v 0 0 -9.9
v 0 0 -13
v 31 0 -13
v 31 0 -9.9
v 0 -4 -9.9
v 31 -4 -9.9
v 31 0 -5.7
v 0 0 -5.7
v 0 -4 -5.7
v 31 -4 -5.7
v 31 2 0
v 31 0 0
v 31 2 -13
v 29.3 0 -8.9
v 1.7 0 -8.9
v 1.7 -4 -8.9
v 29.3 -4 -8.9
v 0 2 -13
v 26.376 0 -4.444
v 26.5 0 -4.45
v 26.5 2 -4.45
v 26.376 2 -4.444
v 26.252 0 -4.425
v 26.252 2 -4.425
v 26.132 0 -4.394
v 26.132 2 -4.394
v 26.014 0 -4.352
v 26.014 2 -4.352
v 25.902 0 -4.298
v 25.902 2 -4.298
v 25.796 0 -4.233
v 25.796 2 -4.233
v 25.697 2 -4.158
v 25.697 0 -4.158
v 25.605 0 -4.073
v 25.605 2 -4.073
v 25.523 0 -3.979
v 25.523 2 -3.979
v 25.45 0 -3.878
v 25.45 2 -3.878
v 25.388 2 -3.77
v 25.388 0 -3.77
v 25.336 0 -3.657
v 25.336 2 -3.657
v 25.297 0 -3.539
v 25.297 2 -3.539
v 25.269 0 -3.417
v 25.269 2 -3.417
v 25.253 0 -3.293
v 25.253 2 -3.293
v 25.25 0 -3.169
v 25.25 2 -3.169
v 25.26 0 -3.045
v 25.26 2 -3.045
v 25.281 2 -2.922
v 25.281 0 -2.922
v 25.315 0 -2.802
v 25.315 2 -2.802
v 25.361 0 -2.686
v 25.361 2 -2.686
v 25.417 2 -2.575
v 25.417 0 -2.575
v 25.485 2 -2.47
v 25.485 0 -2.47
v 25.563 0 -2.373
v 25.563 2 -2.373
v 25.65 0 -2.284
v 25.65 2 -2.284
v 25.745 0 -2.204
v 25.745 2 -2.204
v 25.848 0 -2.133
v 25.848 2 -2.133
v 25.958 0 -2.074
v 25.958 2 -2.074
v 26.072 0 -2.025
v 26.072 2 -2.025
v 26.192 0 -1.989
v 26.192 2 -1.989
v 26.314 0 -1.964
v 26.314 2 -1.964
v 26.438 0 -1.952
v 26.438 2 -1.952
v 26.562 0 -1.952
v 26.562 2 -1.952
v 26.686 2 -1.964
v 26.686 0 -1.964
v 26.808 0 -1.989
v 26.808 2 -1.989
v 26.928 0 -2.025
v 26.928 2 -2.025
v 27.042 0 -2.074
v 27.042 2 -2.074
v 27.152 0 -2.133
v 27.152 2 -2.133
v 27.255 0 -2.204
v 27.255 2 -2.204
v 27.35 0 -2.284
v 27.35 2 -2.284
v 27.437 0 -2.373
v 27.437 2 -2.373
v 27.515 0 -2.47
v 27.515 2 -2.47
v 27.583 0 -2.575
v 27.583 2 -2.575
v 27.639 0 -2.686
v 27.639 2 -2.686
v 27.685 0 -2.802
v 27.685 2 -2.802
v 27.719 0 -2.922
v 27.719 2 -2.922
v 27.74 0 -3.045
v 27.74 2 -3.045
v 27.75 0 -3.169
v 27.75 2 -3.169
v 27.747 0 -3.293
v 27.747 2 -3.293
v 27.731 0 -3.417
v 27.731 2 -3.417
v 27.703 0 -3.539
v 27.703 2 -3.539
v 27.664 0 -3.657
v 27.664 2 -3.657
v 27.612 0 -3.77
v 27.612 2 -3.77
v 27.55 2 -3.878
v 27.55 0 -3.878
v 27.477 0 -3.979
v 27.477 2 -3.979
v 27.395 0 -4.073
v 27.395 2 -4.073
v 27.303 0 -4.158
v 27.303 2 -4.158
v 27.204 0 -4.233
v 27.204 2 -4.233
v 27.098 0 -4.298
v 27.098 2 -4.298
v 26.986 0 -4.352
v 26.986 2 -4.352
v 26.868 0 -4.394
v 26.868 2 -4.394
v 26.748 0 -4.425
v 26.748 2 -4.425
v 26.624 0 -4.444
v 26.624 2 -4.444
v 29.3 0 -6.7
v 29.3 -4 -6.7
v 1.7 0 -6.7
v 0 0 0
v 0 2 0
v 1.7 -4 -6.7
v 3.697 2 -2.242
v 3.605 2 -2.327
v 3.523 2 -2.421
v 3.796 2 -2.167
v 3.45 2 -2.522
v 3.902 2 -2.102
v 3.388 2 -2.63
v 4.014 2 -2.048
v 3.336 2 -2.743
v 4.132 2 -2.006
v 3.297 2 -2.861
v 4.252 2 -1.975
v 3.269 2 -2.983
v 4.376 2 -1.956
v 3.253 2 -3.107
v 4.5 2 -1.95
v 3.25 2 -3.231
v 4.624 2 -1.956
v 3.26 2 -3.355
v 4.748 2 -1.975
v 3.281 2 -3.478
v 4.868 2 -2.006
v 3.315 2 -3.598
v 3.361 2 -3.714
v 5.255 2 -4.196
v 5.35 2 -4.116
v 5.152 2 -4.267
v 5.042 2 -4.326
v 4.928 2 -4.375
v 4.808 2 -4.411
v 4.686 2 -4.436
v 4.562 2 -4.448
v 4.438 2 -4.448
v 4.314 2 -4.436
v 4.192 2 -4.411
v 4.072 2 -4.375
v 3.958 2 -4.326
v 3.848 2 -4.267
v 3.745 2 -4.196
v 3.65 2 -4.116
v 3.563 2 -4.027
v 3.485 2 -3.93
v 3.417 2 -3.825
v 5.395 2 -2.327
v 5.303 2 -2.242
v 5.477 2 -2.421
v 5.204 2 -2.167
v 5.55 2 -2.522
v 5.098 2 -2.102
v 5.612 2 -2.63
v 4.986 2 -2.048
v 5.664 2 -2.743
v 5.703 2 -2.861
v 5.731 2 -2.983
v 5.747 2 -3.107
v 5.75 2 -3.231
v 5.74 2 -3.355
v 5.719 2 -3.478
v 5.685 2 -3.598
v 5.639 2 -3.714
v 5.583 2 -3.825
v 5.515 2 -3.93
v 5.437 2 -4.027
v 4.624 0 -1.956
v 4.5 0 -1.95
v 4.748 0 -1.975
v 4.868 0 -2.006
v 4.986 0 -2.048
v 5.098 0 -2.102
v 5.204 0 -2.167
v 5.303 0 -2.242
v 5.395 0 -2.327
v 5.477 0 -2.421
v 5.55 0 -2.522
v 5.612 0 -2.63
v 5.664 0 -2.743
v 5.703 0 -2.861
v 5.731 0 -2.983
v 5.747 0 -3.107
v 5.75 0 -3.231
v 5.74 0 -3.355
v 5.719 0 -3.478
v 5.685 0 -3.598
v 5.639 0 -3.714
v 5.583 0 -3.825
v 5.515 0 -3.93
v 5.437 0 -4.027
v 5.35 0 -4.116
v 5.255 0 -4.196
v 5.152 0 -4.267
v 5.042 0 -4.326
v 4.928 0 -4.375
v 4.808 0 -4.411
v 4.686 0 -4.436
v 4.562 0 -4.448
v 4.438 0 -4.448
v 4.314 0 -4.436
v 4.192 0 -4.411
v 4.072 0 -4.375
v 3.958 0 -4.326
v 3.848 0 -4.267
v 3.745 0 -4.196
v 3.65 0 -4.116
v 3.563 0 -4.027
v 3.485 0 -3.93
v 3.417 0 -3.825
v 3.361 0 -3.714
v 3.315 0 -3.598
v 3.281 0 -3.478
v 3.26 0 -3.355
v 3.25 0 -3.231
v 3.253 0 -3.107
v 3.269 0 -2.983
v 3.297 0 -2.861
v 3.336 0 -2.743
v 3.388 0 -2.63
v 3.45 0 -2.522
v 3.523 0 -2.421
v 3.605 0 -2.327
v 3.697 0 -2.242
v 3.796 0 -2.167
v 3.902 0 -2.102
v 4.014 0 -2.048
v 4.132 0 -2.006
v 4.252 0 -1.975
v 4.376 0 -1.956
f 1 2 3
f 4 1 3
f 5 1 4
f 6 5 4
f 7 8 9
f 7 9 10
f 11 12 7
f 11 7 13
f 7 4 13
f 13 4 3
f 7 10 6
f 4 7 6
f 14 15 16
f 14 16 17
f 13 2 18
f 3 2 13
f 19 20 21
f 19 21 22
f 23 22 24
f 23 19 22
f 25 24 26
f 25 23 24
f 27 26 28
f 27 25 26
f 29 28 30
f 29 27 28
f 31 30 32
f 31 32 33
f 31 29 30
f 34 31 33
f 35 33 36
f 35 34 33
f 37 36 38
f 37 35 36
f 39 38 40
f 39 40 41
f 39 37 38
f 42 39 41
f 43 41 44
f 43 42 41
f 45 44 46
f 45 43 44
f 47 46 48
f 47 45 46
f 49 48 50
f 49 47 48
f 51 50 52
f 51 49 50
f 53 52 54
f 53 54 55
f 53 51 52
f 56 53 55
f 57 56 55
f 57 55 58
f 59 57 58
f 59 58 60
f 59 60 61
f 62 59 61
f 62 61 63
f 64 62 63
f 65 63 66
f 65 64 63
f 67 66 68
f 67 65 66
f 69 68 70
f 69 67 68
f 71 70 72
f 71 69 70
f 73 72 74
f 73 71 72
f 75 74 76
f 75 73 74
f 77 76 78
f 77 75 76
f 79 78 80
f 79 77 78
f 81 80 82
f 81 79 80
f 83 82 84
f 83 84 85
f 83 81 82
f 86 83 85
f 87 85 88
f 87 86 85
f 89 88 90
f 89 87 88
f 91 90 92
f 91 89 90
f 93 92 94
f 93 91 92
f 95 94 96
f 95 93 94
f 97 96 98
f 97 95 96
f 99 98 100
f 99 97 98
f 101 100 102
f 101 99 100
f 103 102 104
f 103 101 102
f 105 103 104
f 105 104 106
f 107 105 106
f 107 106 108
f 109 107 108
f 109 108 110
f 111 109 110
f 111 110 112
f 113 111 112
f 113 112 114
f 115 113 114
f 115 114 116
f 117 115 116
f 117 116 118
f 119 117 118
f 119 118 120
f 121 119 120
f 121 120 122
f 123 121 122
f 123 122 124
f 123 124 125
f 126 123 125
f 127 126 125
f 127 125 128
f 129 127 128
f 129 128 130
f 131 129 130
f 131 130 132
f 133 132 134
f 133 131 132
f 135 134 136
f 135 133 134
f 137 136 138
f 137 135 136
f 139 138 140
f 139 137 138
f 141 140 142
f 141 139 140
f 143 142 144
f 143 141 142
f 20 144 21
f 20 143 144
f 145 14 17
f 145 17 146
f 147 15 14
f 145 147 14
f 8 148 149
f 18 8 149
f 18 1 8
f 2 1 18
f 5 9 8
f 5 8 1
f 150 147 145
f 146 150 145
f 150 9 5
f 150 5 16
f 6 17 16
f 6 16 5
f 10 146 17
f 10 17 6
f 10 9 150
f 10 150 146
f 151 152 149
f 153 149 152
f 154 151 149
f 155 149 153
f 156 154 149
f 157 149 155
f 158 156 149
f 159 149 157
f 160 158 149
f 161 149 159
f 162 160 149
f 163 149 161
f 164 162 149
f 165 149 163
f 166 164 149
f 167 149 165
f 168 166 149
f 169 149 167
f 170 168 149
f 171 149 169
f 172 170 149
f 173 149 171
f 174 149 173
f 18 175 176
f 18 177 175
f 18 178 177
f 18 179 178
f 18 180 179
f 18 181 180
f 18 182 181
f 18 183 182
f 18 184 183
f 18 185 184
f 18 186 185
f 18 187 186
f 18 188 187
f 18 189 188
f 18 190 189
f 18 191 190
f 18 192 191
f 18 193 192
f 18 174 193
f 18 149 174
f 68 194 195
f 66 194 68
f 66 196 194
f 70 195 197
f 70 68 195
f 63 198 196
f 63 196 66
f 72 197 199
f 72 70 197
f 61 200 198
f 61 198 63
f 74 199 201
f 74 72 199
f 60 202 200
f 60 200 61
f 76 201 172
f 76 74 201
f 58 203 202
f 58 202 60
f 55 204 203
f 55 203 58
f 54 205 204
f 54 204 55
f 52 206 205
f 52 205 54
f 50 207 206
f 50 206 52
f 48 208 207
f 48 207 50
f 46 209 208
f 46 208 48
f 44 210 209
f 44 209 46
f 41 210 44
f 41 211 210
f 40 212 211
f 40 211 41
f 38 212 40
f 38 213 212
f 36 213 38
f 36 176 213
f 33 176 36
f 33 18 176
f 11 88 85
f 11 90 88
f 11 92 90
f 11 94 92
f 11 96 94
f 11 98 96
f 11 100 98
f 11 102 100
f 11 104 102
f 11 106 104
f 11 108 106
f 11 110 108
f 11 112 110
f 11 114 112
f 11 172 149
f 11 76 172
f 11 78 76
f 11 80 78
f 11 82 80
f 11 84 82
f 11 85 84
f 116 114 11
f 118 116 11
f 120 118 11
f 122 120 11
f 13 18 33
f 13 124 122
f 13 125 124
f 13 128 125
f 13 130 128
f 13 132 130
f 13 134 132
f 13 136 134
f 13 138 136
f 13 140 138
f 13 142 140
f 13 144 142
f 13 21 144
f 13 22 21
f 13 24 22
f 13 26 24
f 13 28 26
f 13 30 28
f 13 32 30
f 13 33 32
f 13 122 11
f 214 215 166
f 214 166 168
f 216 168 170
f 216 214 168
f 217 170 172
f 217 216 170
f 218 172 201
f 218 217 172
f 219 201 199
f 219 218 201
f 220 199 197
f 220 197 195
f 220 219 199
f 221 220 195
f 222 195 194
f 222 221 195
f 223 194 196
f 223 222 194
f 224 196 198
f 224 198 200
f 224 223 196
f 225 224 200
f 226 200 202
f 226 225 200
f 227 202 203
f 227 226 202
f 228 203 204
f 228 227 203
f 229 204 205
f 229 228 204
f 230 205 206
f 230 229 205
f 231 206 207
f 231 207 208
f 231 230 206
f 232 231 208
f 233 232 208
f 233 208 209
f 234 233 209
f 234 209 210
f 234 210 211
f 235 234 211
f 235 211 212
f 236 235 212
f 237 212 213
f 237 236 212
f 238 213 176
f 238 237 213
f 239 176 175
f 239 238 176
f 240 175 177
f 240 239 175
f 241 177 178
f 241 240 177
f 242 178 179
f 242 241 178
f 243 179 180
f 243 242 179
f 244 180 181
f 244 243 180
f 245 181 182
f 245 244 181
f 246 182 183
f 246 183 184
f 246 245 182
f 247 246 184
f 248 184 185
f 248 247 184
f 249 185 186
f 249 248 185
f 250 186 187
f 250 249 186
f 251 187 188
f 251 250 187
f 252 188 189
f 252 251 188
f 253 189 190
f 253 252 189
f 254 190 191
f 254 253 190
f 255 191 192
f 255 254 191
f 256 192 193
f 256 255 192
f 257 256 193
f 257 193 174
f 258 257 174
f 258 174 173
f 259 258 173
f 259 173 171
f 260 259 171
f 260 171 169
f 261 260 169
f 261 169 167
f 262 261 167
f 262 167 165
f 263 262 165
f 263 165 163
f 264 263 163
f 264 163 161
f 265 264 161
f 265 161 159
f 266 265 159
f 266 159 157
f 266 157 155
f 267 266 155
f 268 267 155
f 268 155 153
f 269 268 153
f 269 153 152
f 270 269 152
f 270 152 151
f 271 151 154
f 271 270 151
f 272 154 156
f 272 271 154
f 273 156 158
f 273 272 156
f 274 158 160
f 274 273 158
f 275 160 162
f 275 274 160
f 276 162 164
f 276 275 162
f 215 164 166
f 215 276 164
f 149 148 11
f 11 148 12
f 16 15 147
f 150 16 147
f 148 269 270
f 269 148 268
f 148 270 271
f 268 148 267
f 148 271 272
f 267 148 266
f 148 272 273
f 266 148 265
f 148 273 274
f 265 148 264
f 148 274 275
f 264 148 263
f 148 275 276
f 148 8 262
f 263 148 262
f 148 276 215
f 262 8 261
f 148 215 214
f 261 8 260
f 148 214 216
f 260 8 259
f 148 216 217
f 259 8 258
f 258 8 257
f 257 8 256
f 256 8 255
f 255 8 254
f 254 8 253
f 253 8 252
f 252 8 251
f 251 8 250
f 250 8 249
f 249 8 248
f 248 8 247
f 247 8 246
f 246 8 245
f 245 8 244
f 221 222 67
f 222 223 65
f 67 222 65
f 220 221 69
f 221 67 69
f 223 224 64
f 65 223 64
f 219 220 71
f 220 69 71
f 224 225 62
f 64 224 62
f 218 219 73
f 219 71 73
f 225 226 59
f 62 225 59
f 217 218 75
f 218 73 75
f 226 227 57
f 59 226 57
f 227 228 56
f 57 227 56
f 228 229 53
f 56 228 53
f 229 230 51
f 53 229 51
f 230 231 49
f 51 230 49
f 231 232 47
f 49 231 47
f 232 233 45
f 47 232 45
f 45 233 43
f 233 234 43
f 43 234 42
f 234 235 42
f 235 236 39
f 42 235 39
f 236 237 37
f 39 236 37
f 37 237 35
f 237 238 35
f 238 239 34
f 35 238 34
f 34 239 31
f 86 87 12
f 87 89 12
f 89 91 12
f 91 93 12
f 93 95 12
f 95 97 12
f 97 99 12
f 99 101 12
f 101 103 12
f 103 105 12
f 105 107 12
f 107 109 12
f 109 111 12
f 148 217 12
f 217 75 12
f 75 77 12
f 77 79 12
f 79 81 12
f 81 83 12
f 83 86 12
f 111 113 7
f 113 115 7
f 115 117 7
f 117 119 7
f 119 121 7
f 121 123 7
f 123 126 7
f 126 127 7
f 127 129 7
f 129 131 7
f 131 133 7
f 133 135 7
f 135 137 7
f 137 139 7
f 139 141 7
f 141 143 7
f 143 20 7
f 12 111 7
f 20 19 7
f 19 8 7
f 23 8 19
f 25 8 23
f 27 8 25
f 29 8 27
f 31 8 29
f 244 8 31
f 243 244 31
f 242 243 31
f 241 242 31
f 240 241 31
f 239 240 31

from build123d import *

# Parameters (mm, degrees)
SKETCH1_W           = 31
SKETCH1_H           = 13
SKETCH1_R           = 1.25
BOSS_EXTRUDE1_DEPTH = 2
SKETCH2_W           = 31
SKETCH2_H           = 4.2
SKETCH2_W_2         = 27.6
SKETCH2_H_2         = 2.2
BOSS_EXTRUDE2_DEPTH = 4


with BuildPart() as part:
    # Sketch1 → Boss-Extrude1 (new body)
    with BuildSketch(Plane(origin=(0, 0, 0), x_dir=(1, 0, 0), z_dir=(0, 1, 0))):
        with Locations((15.5, 6.5)):
            Rectangle(SKETCH1_W, SKETCH1_H)
        with Locations(Location((4.5, 3.2, 0), (0, 0, 270))):
            Circle(SKETCH1_R, mode=Mode.SUBTRACT)
        with Locations(Location((26.5, 3.2, 0), (0, 0, 90))):
            Circle(SKETCH1_R, mode=Mode.SUBTRACT)
    extrude(amount=BOSS_EXTRUDE1_DEPTH)

    # Sketch2 → Boss-Extrude2 (add)
    with BuildSketch(Plane.XZ):
        with Locations((15.5, -7.8)):
            Rectangle(SKETCH2_W, SKETCH2_H)
        with Locations((15.5, -7.8)):
            Rectangle(SKETCH2_W_2, SKETCH2_H_2, mode=Mode.SUBTRACT)
    extrude(amount=BOSS_EXTRUDE2_DEPTH)


solid = part.part
